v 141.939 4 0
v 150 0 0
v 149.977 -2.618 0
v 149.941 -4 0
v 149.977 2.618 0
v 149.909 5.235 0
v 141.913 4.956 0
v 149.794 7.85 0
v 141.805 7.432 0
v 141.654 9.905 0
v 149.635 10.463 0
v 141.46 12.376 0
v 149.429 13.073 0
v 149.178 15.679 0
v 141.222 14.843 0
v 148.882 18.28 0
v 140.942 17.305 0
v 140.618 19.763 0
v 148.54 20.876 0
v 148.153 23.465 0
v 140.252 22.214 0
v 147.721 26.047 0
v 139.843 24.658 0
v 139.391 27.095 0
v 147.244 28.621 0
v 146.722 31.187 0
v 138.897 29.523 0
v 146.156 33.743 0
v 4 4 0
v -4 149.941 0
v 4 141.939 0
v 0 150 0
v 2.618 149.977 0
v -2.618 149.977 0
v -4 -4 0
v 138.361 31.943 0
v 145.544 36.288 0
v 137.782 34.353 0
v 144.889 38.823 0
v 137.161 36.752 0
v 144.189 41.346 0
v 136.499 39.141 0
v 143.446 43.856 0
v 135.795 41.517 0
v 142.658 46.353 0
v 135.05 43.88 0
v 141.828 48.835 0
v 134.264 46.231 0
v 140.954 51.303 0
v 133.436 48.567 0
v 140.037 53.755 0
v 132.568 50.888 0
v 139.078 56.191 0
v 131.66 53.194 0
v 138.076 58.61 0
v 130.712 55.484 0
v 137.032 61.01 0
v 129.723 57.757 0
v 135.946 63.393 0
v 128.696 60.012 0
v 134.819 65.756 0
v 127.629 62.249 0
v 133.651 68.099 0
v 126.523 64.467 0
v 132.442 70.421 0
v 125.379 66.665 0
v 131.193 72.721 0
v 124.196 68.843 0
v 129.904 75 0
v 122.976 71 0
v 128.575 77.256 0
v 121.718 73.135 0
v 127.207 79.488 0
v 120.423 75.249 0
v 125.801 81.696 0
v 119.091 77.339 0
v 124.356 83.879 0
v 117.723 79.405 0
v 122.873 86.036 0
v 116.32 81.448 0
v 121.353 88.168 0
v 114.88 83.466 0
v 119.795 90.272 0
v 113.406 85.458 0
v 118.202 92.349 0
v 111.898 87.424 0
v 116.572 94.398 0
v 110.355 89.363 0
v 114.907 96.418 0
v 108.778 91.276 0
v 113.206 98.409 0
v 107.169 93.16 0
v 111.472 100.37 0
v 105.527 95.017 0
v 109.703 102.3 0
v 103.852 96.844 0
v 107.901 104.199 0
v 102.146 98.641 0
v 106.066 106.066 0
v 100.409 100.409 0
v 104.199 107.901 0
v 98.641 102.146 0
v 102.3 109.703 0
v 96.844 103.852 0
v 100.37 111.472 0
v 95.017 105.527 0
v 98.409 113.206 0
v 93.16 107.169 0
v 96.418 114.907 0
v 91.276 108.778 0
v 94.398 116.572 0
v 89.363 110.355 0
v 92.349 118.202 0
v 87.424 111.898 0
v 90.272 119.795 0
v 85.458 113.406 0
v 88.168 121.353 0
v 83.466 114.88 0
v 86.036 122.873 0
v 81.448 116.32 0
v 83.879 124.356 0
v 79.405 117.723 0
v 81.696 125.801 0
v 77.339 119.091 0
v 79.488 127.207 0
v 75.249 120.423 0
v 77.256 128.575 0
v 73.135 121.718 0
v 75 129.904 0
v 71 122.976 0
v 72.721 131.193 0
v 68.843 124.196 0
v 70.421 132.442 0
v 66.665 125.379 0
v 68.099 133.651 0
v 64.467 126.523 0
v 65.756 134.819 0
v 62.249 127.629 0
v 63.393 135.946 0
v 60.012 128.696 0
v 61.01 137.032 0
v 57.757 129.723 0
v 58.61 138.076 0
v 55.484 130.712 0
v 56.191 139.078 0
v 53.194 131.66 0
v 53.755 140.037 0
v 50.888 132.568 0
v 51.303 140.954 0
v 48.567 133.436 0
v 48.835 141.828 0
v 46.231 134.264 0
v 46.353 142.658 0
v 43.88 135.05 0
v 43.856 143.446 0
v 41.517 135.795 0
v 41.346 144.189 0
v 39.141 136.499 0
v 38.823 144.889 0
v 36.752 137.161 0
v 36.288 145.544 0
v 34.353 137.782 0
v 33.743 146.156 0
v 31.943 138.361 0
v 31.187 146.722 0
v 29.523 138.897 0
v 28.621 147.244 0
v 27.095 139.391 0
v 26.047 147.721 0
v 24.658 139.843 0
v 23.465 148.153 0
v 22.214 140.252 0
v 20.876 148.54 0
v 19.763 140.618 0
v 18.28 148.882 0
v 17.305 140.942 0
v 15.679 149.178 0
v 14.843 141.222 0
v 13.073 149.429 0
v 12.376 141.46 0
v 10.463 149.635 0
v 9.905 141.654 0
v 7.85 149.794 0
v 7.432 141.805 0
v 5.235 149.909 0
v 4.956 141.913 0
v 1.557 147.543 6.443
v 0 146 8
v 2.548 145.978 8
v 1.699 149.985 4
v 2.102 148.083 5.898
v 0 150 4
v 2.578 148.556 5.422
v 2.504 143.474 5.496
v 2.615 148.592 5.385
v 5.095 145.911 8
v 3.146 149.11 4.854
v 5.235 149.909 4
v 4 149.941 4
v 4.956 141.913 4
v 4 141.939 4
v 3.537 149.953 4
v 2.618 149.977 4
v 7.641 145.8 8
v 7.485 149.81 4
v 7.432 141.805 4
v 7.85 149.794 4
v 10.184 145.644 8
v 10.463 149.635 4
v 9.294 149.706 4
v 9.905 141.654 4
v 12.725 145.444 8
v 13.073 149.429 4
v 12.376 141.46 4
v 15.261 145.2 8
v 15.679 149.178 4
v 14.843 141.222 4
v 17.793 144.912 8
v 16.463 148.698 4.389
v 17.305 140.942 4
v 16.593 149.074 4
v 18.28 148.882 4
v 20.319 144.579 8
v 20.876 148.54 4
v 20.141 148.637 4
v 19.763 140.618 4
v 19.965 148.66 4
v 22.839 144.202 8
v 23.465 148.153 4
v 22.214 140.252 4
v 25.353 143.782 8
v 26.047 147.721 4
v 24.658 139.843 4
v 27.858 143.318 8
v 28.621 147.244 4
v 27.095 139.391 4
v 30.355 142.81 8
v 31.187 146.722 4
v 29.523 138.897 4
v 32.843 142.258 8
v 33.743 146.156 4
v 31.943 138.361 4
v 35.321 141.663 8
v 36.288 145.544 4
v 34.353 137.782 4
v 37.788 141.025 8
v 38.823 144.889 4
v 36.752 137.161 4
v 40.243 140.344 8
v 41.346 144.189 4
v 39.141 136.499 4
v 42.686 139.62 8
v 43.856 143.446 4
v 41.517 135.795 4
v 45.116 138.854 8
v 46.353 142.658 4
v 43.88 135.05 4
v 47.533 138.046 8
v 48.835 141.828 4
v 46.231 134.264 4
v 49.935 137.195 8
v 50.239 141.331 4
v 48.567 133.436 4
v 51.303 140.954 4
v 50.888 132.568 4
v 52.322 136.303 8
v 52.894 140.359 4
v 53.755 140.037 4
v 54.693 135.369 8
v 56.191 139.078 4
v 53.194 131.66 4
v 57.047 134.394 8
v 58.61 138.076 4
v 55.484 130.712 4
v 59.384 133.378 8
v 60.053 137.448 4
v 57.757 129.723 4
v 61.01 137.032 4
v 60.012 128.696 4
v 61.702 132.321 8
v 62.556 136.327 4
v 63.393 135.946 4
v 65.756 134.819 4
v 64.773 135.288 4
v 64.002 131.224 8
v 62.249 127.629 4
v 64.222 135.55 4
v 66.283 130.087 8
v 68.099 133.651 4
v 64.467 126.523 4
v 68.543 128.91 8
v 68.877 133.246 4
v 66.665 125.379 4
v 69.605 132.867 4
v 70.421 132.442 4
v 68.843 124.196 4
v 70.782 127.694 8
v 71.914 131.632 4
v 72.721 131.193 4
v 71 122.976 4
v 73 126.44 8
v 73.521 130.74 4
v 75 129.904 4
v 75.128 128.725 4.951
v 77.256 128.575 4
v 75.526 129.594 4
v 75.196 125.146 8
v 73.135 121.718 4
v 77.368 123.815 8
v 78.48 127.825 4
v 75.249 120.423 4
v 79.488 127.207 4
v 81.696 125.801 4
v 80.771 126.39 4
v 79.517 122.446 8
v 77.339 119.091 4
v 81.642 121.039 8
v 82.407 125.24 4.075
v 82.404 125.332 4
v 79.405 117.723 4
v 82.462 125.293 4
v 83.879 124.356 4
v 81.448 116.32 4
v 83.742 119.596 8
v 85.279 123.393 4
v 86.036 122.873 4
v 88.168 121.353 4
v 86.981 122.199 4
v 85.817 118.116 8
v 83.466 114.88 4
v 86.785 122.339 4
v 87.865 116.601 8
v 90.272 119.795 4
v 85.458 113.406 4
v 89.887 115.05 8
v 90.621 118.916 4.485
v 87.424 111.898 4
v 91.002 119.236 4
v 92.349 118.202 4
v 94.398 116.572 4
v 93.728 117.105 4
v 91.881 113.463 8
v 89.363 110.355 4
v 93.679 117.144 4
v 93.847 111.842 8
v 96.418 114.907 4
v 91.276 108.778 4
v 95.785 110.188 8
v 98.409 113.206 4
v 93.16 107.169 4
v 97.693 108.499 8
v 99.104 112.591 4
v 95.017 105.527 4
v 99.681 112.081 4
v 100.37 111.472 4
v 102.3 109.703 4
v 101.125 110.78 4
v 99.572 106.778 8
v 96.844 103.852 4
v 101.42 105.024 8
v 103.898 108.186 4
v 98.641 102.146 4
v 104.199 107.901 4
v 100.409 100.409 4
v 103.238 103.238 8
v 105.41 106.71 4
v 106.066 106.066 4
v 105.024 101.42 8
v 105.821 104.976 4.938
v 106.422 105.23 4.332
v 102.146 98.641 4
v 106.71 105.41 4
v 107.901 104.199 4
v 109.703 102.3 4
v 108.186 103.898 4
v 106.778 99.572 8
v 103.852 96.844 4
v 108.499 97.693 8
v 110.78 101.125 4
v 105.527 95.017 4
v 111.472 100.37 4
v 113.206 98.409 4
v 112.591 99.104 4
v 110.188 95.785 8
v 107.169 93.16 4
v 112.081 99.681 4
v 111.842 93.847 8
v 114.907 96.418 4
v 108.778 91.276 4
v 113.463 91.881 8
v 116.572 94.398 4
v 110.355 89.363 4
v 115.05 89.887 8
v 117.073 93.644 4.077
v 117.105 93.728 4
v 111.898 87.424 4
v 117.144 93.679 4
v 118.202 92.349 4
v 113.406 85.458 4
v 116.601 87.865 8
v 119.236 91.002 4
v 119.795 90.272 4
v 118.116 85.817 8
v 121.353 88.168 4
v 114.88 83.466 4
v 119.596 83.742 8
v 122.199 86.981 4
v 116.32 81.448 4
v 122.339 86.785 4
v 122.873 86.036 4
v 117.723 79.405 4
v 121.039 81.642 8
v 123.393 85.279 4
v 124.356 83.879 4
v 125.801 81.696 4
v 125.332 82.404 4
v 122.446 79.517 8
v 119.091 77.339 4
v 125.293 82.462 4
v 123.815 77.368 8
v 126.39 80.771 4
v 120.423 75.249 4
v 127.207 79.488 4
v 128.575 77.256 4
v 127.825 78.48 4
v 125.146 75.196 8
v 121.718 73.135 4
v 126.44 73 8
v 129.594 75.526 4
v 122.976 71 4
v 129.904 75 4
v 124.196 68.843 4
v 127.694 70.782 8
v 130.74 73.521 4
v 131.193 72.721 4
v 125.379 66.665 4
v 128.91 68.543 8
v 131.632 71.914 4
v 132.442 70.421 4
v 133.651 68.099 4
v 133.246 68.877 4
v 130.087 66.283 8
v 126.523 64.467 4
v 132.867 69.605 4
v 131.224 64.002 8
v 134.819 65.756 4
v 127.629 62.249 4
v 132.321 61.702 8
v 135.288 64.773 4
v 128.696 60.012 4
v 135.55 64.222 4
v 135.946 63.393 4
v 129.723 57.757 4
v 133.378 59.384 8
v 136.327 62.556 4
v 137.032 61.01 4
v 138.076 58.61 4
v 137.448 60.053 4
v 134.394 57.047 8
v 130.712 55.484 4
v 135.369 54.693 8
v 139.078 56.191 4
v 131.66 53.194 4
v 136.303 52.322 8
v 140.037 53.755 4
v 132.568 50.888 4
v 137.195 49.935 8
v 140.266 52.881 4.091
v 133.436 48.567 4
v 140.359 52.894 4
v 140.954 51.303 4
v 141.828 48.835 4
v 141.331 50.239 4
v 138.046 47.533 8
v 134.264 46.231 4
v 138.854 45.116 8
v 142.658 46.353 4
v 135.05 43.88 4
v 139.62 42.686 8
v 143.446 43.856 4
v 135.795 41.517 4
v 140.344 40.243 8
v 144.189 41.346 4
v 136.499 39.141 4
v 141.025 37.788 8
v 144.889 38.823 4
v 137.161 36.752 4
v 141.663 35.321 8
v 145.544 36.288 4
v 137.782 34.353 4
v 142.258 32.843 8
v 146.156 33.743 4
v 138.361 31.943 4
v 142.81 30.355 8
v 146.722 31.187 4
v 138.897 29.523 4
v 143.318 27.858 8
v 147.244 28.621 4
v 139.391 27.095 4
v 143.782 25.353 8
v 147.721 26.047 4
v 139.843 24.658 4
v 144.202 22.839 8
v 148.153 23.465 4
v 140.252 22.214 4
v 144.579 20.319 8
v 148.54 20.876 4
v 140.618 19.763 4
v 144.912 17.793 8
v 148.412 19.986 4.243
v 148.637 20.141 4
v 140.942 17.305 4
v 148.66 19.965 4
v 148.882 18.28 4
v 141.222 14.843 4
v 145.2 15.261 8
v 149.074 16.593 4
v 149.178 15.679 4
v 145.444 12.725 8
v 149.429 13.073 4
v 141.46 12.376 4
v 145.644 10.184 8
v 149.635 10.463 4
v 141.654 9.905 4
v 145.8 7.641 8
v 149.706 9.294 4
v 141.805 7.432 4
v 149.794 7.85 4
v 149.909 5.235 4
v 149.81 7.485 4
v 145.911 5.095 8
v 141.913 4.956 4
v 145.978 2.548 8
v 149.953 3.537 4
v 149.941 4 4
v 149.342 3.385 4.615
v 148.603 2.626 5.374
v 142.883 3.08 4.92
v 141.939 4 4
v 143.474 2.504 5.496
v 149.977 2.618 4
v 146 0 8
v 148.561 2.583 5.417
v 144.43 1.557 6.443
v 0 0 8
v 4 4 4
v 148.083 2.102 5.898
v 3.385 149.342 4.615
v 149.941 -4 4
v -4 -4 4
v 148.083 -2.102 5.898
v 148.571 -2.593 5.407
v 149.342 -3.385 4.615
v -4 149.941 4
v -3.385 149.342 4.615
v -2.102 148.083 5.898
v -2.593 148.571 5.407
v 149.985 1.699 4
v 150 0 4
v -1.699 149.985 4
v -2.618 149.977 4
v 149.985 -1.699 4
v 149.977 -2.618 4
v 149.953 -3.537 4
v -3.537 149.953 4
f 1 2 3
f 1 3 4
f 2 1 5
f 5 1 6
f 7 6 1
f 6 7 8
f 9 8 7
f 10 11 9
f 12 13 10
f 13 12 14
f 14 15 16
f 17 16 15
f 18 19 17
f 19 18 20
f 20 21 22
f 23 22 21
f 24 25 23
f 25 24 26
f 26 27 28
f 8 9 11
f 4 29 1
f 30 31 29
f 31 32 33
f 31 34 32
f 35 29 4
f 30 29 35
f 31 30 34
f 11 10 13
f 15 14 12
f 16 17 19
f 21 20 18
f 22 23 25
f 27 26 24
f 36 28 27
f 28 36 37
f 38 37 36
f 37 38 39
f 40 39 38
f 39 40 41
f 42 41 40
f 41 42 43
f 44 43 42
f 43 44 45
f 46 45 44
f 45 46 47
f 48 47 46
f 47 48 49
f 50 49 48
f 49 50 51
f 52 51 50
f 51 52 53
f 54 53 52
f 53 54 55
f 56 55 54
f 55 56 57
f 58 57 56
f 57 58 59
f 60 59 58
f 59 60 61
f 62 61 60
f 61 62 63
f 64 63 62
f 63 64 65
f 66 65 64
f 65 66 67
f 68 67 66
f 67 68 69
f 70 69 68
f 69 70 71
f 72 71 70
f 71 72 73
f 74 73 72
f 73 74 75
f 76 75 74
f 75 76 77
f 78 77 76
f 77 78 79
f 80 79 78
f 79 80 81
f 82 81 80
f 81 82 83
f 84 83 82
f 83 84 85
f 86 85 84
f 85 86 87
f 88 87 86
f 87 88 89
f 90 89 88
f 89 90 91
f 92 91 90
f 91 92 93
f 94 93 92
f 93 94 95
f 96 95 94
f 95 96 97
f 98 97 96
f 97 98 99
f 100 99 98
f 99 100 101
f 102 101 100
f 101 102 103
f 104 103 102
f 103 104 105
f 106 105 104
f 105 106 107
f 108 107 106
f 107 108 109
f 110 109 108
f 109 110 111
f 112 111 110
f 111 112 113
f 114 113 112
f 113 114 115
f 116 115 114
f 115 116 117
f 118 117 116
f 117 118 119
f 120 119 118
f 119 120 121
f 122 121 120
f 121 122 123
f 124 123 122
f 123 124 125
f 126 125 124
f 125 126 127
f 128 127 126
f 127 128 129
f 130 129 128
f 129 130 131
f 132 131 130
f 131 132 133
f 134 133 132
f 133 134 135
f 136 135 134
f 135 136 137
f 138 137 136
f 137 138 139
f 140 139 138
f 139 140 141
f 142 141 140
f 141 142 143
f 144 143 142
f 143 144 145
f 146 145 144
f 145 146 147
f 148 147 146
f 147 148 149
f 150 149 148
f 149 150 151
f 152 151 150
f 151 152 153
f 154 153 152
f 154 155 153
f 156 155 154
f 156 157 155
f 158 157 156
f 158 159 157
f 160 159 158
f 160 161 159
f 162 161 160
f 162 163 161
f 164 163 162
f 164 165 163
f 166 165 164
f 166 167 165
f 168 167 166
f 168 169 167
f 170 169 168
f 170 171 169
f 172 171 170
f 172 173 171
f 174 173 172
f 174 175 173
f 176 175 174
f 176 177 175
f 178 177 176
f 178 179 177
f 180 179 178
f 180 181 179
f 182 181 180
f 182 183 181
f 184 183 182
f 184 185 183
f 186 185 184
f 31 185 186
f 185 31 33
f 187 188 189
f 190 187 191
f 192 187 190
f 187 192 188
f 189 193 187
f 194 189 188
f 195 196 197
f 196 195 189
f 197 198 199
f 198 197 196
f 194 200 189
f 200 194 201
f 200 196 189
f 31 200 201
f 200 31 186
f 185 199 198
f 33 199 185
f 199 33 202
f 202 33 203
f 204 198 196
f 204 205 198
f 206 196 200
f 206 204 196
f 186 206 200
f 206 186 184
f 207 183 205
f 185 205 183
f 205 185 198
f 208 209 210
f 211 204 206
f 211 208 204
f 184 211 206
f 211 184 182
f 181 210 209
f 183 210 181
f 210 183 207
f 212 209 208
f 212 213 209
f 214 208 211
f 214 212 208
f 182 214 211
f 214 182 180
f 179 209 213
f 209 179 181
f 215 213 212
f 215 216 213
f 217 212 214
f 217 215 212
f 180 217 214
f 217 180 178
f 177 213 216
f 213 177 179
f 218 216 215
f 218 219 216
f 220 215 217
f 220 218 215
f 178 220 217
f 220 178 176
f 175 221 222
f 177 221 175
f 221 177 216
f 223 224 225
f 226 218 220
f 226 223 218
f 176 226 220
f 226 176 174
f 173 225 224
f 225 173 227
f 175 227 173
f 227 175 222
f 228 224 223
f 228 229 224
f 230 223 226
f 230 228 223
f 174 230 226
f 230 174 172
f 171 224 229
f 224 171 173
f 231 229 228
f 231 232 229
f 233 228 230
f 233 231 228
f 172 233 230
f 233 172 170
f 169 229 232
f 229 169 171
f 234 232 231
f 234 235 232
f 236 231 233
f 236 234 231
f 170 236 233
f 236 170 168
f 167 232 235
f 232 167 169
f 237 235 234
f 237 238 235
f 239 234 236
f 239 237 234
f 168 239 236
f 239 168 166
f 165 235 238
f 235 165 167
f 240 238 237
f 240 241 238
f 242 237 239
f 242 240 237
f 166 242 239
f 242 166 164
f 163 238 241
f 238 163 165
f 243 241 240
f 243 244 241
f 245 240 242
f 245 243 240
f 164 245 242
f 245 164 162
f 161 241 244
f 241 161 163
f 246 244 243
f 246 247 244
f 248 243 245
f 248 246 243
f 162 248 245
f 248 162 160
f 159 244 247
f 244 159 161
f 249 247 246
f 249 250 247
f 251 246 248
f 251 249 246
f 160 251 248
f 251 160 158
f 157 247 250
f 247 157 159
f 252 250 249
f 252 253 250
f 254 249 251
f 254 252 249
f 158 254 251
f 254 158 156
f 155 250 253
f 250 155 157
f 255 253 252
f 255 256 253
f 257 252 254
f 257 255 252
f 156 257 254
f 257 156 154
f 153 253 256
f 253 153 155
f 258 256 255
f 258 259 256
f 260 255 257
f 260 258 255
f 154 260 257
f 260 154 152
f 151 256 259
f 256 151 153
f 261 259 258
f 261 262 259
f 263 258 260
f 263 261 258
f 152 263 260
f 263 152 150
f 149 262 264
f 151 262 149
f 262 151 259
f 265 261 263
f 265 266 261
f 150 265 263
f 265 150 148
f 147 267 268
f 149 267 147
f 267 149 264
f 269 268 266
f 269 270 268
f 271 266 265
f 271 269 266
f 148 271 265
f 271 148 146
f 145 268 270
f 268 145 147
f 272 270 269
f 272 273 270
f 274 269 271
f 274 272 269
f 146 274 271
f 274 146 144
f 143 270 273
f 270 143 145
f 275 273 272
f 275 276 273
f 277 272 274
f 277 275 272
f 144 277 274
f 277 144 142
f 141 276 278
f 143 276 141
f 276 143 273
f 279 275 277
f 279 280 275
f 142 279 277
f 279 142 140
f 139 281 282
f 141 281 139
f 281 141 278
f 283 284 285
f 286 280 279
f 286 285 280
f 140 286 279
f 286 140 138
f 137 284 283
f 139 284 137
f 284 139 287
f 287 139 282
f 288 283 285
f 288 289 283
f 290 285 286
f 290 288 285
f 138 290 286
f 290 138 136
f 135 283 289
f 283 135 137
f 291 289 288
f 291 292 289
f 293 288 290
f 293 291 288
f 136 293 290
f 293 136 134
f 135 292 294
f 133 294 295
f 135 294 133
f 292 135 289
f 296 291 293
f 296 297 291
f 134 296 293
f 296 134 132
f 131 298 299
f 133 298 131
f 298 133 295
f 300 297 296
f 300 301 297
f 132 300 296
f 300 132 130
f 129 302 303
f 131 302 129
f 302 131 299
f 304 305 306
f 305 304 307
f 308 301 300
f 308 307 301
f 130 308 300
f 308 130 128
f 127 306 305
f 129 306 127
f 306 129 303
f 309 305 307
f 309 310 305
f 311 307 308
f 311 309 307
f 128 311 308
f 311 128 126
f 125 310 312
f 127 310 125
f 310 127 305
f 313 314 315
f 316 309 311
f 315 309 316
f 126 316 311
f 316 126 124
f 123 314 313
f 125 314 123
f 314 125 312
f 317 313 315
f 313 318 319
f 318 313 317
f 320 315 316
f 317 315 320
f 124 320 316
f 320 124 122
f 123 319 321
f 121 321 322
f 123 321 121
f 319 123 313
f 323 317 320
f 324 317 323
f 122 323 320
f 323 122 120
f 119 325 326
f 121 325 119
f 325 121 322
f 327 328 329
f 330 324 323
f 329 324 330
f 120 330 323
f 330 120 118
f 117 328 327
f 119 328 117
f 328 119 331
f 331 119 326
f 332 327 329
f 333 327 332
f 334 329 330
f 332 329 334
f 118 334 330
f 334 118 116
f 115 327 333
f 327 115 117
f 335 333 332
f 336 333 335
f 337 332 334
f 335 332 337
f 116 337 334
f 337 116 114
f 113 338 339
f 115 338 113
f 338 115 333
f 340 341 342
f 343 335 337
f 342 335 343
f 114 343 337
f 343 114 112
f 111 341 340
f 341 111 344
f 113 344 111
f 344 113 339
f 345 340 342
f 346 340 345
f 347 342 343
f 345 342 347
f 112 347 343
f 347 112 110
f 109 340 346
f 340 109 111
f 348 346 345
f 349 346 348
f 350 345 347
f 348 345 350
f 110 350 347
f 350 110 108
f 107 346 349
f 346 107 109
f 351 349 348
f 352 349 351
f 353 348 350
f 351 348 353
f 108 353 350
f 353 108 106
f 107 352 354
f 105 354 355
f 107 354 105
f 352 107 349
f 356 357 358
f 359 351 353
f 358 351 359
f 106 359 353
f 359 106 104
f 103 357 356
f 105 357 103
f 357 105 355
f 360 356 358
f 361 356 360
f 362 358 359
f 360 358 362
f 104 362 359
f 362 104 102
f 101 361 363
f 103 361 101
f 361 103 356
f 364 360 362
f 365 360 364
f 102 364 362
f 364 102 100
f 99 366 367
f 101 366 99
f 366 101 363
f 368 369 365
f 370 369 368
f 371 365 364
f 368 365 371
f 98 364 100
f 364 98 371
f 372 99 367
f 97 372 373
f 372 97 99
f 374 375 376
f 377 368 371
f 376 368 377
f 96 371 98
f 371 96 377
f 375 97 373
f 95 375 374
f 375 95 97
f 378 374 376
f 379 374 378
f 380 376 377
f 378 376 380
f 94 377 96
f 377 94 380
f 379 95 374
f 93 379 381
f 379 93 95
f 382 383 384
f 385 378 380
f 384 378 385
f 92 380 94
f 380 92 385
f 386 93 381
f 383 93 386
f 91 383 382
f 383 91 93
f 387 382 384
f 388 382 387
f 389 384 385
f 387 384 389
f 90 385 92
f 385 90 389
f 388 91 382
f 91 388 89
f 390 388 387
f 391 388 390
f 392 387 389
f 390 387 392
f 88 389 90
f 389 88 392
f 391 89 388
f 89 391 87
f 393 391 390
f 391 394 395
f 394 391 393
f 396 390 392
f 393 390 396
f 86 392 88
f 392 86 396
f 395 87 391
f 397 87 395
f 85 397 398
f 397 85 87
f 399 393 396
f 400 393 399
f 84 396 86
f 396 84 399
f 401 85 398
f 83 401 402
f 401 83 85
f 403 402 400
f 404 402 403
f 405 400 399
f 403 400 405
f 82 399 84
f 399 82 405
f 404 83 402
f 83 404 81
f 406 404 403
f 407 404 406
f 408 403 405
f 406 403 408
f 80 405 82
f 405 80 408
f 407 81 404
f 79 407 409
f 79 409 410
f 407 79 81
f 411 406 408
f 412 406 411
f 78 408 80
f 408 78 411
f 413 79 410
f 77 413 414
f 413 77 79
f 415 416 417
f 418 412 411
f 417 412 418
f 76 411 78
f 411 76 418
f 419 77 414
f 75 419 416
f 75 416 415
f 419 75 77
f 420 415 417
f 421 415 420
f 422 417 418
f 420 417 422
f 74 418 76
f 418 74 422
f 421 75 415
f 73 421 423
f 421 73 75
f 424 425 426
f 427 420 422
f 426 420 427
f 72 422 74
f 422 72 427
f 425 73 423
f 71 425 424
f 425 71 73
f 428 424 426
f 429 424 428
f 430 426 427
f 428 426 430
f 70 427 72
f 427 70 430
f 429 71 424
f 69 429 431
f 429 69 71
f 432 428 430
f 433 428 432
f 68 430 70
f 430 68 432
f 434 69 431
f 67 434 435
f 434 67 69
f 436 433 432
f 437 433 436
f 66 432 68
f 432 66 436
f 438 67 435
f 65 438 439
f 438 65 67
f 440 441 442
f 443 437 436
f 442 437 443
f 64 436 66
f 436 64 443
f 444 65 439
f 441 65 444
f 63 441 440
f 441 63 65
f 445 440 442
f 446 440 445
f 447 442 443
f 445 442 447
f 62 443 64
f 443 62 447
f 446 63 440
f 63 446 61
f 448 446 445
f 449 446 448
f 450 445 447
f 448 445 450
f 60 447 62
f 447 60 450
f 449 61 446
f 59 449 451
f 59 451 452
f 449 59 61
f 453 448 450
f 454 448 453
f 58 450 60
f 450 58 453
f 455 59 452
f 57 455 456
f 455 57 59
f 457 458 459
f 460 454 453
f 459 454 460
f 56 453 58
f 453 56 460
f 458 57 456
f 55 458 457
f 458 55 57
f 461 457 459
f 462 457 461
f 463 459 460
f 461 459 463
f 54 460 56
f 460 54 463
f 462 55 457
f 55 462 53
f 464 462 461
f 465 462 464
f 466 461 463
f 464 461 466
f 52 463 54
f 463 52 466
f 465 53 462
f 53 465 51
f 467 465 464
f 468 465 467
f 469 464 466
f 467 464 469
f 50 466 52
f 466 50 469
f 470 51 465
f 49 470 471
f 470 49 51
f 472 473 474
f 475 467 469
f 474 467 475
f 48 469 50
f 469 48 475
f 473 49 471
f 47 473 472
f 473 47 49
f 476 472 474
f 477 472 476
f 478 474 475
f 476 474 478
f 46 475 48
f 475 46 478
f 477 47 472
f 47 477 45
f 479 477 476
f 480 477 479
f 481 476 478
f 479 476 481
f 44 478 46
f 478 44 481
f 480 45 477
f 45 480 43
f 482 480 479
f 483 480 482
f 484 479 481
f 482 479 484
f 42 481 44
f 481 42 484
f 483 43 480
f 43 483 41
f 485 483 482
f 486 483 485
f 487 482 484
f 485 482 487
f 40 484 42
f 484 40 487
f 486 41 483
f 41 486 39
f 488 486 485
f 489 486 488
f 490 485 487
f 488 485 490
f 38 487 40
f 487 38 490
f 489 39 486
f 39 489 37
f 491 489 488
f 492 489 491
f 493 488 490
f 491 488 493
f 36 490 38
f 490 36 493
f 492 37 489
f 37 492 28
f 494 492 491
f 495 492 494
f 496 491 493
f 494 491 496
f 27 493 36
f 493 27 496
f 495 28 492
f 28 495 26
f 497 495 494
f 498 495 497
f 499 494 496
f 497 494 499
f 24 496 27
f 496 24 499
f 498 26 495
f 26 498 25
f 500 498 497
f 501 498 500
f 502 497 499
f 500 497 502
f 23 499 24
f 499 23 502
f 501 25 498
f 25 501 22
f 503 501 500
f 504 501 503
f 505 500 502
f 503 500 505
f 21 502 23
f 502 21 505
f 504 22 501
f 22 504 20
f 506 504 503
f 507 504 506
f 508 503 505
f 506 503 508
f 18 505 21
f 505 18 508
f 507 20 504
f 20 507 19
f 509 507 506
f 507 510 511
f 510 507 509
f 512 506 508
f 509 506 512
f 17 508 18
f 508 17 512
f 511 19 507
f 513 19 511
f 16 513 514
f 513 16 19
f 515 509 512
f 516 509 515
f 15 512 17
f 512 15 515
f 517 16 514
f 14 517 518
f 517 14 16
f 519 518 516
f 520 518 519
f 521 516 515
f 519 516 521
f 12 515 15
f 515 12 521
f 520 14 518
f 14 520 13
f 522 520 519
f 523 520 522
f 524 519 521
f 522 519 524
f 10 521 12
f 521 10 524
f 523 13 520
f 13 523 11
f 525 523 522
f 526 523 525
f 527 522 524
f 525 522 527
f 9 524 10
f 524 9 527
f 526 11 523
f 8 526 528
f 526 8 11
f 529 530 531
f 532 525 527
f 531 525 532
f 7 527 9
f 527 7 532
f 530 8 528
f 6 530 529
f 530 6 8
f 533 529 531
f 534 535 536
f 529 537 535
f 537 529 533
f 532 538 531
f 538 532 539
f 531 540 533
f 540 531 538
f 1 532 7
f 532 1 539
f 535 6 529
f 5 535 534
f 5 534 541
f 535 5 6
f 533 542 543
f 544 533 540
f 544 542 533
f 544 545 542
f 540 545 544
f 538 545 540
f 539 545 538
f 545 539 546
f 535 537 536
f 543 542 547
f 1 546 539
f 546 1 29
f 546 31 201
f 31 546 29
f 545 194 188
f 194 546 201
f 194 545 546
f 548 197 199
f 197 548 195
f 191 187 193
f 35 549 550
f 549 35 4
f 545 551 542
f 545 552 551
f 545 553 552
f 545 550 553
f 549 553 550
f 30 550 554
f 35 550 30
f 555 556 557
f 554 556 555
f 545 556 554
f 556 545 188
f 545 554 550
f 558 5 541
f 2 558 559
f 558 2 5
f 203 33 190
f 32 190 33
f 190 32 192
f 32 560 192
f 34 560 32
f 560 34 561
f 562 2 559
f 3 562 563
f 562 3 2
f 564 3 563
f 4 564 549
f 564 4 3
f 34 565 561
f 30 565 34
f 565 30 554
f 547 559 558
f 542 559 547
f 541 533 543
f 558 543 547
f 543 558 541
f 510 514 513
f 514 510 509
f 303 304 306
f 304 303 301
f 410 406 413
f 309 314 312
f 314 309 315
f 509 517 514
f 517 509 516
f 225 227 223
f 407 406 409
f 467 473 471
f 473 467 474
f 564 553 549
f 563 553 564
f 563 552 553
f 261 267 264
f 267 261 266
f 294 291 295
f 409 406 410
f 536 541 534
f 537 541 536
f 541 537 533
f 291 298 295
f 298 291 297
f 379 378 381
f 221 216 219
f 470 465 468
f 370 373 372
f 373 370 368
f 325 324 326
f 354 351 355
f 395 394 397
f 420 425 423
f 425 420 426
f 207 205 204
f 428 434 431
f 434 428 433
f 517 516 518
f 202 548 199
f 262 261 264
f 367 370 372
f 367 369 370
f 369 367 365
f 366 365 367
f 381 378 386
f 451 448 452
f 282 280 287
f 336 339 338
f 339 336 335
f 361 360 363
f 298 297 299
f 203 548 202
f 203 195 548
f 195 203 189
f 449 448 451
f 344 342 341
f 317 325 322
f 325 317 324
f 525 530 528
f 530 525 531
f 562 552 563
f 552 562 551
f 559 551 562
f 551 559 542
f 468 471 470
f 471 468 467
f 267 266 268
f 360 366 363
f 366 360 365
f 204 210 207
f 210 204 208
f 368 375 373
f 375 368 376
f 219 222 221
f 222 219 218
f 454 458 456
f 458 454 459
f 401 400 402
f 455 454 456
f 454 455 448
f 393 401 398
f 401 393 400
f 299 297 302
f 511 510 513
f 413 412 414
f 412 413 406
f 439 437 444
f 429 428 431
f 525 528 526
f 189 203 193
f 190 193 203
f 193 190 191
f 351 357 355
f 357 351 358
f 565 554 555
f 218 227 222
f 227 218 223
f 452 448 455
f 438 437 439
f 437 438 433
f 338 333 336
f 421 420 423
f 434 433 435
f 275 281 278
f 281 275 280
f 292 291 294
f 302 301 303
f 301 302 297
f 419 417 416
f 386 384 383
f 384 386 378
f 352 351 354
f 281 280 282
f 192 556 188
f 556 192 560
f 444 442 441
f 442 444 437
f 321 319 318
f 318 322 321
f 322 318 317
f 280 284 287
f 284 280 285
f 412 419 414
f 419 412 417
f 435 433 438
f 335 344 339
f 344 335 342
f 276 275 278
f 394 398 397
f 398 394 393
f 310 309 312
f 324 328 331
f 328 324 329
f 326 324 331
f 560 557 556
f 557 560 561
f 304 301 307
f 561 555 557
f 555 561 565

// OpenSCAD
// file: ../lib/project/ring_profile.scad
// Shared floating plant ring profile helpers.

function ring_inner_radius(ring_outer_diameter, cross_section_width) =
  (ring_outer_diameter - (2 * cross_section_width)) / 2;

function ring_outer_radius(ring_outer_diameter) = ring_outer_diameter / 2;

function ring_center_radius(ring_outer_diameter, cross_section_width) =
  (ring_inner_radius(ring_outer_diameter, cross_section_width) +
   ring_outer_radius(ring_outer_diameter)) / 2;

function triangle_height_from_angle(cross_section_width, top_angle) =
  tan(top_angle) * (cross_section_width / 2);

function rectangle_height_from_total(cross_section_total_height, cross_section_width, top_angle) =
  cross_section_total_height - triangle_height_from_angle(cross_section_width, top_angle);

module ring_cross_section(
  ring_outer_diameter,
  cross_section_width,
  cross_section_total_height,
  top_angle
) {
  inner_r = ring_inner_radius(ring_outer_diameter, cross_section_width);
  outer_r = ring_outer_radius(ring_outer_diameter);
  center_r = ring_center_radius(ring_outer_diameter, cross_section_width);
  rectangle_h = rectangle_height_from_total(
    cross_section_total_height,
    cross_section_width,
    top_angle
  );

  polygon(points = [
    [inner_r, 0],
    [outer_r, 0],
    [outer_r, rectangle_h],
    [center_r, cross_section_total_height],
    [inner_r, rectangle_h]
  ]);
}

module side_cross_section(cross_section_width, cross_section_total_height, top_angle) {
  rectangle_h = rectangle_height_from_total(
    cross_section_total_height,
    cross_section_width,
    top_angle
  );

  polygon(points = [
    [0, 0],
    [cross_section_width, 0],
    [cross_section_width, rectangle_h],
    [cross_section_width / 2, cross_section_total_height],
    [0, rectangle_h]
  ]);
}

module radial_side_cross_section(cross_section_width, cross_section_total_height, top_angle) {
  rectangle_h = rectangle_height_from_total(
    cross_section_total_height,
    cross_section_width,
    top_angle
  );

  polygon(points = [
    [0, 0],
    [cross_section_width * 2, 0],
    [cross_section_width * 2, cross_section_total_height],
    [cross_section_width / 2, cross_section_total_height],
    [0, rectangle_h]
  ]);
}
// main file
// Angled floating plant ring with a shaped cross-section.

use <../lib/project/ring_profile.scad>;

// ---------- Public parameters (mm) ----------
ring_outer_diameter = 300;
cross_section_width = 8;
cross_section_total_height = 8;
top_angle = 45; // Angle of top surfaces in degrees.
ring_angle = 90; // Ring sweep in degrees (360 full, 180 half, 90 quarter).

// ---------- Resolution ----------
$fa = 1;
$fs = 1;

// ---------- Derived ----------
ring_outer_radius = ring_outer_diameter / 2;
ring_center_radius = ring_center_radius(ring_outer_diameter, cross_section_width);
// Radius used to clip the angled sector (slightly larger than outer radius).
sector_radius = ring_outer_radius + 1;
// Extra height to guarantee the clipping solid fully covers the ring.
sector_height = cross_section_total_height + 1;
sector_step = 5; // Degrees per segment for the clipping sector arc.
side_extension = cross_section_width * 2;
side_length = ring_outer_radius + side_extension;
radial_side_extra = 0.1;
cleanup_length = ring_outer_diameter;
cleanup_depth = ring_outer_radius;
cleanup_height = cross_section_total_height * 3;

triangle_height = triangle_height_from_angle(cross_section_width, top_angle);
rectangle_height = rectangle_height_from_total(cross_section_total_height, cross_section_width, top_angle);

// ---------- Cross-section profiles ----------
module cross_section() {
    ring_cross_section(
      ring_outer_diameter = ring_outer_diameter,
      cross_section_width = cross_section_width,
      cross_section_total_height = cross_section_total_height,
      top_angle = top_angle
    );
}

module side_profile() {
    side_cross_section(
      cross_section_width = cross_section_width,
      cross_section_total_height = cross_section_total_height,
      top_angle = top_angle
    );
}

module radial_side_profile() {
    radial_side_cross_section(
      cross_section_width = cross_section_width,
      cross_section_total_height = cross_section_total_height,
      top_angle = top_angle
    );
}

// ---------- Union construction ----------
module angled_floating_ring_cleaned(angle = ring_angle) {
    intersection() {
        intersection() {
            difference() {
                angled_floating_ring_union(angle);
                first_radial_vertical_cleanup_volume();
                first_radial_angled_top_cleanup_volume();
                second_radial_vertical_cleanup_volume();
                second_radial_angled_top_cleanup_volume();
            }
            outer_arc_vertical_cleanup_volume();
        }
        outer_arc_angled_top_cleanup_volume();
    }
}

module angled_floating_ring_union(angle = ring_angle) {
    union() {
        ring_slice(angle);
        radial_side(length = side_length, reflect = true);
        rotate([0, 0, angle])
            radial_side(length = side_length);
    }
}

module full_ring() {
    rotate_extrude(angle = 360) {
        cross_section();
    }
}

module ring_slice(angle = ring_angle) {
    intersection() {
        full_ring();
        ring_sector(angle);
    }
}

module ring_sector(angle = ring_angle) {
    translate([0, 0, -0.5]) {
        linear_extrude(height = sector_height) {
            sector_2d(sector_radius, angle, sector_step);
        }
    }
}

// ---------- Radial sides ----------
module radial_side(length = ring_outer_radius, reflect = false) {
    // Extrude the same profile along the radius to create a straight side.
    rotate([0, 90, 0])
    rotate([0, 0, 90])
          if (reflect)
            mirror([1, 0, 0])
            translate([-cross_section_width / 2, 0, -side_extension])
              linear_extrude(height = length) {
                  radial_side_profile();
              }
          else
            translate([-cross_section_width / 2, 0, -side_extension])
            linear_extrude(height = length) {
                radial_side_profile();
            }
}


// ---------- Radial cleanup volumes ----------
module first_radial_vertical_cleanup_volume() {
    // Large slab aligned to the first radial side (side_angle = 0).
    translate([-ring_outer_radius, -ring_outer_radius - cross_section_width / 2, -cross_section_total_height])
      cube([cleanup_length, cleanup_depth, cleanup_height]);
}

module first_radial_angled_top_cleanup_volume() {
    // Large angled slab aligned to the first radial side (side_angle = 0).
    translate([0, 0, cross_section_total_height])
    rotate([top_angle - 90, 0, 0])
      translate([-ring_outer_radius, -ring_outer_radius, -cross_section_total_height])
        cube([cleanup_length, cleanup_depth, cleanup_height]);
}

module second_radial_vertical_cleanup_volume() {
    rotate([0, 0, ring_angle])
      translate([-ring_outer_radius, cross_section_width / 2, -cross_section_total_height])
        cube([cleanup_length, cleanup_depth, cleanup_height]);
}

module second_radial_angled_top_cleanup_volume() {
    // Large angled slab aligned to the second radial side (side_angle = ring_angle).
    rotate([0, 0, ring_angle])
      translate([0, 0, cross_section_total_height])
        rotate([-90 - top_angle, 0, 0])
          translate([-ring_outer_radius, -ring_outer_radius, -cross_section_total_height])
            cube([cleanup_length, cleanup_depth, cleanup_height]);
}

// ---------- Outer arc cleanup volumes ----------
module outer_arc_vertical_cleanup_volume() {
    translate([0, 0, cross_section_total_height / 2])
        cylinder(h = cleanup_height, r = ring_outer_radius, center = true);
}

module outer_arc_angled_top_cleanup_volume() {
    // Cone matching the outer angled top surface.
    extra_height = cross_section_total_height;
    slope = (ring_outer_radius - ring_center_radius) / triangle_height;
    total_height = triangle_height + extra_height;
    bottom_radius = ring_center_radius + (slope * total_height);
    translate([0, 0, rectangle_height - extra_height])
        cylinder(h = total_height, r1 = bottom_radius, r2 = ring_center_radius);
}

// ---------- Utility ----------
module sector_2d(radius, angle, step) {
    polygon(points = concat(
        [[0, 0]],
        [for (a = [0 : step : angle]) [radius * cos(a), radius * sin(a)]],
        [[0, 0]]
    ));
}

// angled_floating_ring_union();
angled_floating_ring_cleaned();
